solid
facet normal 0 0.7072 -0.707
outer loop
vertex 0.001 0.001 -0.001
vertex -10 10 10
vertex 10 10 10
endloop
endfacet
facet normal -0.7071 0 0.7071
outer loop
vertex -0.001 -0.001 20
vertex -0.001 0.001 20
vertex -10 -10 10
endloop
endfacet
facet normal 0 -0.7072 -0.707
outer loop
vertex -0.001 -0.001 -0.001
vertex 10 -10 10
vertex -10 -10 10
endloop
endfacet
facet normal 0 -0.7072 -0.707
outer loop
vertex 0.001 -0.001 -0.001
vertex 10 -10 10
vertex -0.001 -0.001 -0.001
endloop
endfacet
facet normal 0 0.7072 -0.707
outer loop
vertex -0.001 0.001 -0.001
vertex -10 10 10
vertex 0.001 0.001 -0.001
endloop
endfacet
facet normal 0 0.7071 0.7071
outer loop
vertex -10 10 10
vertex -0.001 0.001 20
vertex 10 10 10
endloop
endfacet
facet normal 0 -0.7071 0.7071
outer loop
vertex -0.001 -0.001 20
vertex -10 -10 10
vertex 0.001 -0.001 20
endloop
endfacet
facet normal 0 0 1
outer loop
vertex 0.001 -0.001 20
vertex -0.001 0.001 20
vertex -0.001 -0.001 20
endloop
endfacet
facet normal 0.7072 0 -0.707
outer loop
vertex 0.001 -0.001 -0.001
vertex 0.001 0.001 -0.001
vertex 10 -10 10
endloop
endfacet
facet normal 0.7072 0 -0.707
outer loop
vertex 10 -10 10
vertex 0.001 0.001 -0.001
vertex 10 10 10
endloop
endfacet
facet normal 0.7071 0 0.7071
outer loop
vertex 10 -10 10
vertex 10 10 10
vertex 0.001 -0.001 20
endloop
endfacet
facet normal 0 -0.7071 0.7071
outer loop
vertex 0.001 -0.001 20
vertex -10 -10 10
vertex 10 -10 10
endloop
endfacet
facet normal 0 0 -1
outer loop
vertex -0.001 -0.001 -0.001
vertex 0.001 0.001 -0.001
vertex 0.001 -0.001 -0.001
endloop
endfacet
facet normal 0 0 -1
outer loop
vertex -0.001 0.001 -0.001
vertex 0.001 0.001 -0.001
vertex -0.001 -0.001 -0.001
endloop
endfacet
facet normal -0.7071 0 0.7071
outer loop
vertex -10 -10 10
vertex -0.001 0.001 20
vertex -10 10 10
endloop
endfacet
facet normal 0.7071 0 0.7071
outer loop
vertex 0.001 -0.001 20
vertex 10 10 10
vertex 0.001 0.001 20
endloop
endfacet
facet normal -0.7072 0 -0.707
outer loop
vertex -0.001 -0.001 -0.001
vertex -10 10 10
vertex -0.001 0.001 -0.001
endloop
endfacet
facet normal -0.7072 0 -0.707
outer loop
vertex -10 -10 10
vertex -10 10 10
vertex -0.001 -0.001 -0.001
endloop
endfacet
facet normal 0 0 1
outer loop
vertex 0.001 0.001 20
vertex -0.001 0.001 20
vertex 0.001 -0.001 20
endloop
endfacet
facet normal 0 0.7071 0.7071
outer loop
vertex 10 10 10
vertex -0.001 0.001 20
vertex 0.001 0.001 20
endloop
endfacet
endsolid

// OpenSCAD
hull(){
    a = 0.001;
    cube(a, center=true);
    translate([10,10,10])
    cube(size=a,center=true);
    translate([-10,-10,10])
    cube(size=a,center=true);
    translate([10,-10,10])
    cube(size=a,center=true);
    translate([-10,10,10])
    cube(size=a,center=true);
    translate([0,0,20])
    cube(size=a,center=true);
    
}


//hull() {
//    translate([15,10,10]) circle(10);
//    circle(10);
//}

// $fn=50;
// 
//minkowski() {
//	cube([10, 10, 10]);
//    rotate([90,0,0]){
//	cylinder(1);}
//}
//
//echo("--- x aixe 90deg ---");
